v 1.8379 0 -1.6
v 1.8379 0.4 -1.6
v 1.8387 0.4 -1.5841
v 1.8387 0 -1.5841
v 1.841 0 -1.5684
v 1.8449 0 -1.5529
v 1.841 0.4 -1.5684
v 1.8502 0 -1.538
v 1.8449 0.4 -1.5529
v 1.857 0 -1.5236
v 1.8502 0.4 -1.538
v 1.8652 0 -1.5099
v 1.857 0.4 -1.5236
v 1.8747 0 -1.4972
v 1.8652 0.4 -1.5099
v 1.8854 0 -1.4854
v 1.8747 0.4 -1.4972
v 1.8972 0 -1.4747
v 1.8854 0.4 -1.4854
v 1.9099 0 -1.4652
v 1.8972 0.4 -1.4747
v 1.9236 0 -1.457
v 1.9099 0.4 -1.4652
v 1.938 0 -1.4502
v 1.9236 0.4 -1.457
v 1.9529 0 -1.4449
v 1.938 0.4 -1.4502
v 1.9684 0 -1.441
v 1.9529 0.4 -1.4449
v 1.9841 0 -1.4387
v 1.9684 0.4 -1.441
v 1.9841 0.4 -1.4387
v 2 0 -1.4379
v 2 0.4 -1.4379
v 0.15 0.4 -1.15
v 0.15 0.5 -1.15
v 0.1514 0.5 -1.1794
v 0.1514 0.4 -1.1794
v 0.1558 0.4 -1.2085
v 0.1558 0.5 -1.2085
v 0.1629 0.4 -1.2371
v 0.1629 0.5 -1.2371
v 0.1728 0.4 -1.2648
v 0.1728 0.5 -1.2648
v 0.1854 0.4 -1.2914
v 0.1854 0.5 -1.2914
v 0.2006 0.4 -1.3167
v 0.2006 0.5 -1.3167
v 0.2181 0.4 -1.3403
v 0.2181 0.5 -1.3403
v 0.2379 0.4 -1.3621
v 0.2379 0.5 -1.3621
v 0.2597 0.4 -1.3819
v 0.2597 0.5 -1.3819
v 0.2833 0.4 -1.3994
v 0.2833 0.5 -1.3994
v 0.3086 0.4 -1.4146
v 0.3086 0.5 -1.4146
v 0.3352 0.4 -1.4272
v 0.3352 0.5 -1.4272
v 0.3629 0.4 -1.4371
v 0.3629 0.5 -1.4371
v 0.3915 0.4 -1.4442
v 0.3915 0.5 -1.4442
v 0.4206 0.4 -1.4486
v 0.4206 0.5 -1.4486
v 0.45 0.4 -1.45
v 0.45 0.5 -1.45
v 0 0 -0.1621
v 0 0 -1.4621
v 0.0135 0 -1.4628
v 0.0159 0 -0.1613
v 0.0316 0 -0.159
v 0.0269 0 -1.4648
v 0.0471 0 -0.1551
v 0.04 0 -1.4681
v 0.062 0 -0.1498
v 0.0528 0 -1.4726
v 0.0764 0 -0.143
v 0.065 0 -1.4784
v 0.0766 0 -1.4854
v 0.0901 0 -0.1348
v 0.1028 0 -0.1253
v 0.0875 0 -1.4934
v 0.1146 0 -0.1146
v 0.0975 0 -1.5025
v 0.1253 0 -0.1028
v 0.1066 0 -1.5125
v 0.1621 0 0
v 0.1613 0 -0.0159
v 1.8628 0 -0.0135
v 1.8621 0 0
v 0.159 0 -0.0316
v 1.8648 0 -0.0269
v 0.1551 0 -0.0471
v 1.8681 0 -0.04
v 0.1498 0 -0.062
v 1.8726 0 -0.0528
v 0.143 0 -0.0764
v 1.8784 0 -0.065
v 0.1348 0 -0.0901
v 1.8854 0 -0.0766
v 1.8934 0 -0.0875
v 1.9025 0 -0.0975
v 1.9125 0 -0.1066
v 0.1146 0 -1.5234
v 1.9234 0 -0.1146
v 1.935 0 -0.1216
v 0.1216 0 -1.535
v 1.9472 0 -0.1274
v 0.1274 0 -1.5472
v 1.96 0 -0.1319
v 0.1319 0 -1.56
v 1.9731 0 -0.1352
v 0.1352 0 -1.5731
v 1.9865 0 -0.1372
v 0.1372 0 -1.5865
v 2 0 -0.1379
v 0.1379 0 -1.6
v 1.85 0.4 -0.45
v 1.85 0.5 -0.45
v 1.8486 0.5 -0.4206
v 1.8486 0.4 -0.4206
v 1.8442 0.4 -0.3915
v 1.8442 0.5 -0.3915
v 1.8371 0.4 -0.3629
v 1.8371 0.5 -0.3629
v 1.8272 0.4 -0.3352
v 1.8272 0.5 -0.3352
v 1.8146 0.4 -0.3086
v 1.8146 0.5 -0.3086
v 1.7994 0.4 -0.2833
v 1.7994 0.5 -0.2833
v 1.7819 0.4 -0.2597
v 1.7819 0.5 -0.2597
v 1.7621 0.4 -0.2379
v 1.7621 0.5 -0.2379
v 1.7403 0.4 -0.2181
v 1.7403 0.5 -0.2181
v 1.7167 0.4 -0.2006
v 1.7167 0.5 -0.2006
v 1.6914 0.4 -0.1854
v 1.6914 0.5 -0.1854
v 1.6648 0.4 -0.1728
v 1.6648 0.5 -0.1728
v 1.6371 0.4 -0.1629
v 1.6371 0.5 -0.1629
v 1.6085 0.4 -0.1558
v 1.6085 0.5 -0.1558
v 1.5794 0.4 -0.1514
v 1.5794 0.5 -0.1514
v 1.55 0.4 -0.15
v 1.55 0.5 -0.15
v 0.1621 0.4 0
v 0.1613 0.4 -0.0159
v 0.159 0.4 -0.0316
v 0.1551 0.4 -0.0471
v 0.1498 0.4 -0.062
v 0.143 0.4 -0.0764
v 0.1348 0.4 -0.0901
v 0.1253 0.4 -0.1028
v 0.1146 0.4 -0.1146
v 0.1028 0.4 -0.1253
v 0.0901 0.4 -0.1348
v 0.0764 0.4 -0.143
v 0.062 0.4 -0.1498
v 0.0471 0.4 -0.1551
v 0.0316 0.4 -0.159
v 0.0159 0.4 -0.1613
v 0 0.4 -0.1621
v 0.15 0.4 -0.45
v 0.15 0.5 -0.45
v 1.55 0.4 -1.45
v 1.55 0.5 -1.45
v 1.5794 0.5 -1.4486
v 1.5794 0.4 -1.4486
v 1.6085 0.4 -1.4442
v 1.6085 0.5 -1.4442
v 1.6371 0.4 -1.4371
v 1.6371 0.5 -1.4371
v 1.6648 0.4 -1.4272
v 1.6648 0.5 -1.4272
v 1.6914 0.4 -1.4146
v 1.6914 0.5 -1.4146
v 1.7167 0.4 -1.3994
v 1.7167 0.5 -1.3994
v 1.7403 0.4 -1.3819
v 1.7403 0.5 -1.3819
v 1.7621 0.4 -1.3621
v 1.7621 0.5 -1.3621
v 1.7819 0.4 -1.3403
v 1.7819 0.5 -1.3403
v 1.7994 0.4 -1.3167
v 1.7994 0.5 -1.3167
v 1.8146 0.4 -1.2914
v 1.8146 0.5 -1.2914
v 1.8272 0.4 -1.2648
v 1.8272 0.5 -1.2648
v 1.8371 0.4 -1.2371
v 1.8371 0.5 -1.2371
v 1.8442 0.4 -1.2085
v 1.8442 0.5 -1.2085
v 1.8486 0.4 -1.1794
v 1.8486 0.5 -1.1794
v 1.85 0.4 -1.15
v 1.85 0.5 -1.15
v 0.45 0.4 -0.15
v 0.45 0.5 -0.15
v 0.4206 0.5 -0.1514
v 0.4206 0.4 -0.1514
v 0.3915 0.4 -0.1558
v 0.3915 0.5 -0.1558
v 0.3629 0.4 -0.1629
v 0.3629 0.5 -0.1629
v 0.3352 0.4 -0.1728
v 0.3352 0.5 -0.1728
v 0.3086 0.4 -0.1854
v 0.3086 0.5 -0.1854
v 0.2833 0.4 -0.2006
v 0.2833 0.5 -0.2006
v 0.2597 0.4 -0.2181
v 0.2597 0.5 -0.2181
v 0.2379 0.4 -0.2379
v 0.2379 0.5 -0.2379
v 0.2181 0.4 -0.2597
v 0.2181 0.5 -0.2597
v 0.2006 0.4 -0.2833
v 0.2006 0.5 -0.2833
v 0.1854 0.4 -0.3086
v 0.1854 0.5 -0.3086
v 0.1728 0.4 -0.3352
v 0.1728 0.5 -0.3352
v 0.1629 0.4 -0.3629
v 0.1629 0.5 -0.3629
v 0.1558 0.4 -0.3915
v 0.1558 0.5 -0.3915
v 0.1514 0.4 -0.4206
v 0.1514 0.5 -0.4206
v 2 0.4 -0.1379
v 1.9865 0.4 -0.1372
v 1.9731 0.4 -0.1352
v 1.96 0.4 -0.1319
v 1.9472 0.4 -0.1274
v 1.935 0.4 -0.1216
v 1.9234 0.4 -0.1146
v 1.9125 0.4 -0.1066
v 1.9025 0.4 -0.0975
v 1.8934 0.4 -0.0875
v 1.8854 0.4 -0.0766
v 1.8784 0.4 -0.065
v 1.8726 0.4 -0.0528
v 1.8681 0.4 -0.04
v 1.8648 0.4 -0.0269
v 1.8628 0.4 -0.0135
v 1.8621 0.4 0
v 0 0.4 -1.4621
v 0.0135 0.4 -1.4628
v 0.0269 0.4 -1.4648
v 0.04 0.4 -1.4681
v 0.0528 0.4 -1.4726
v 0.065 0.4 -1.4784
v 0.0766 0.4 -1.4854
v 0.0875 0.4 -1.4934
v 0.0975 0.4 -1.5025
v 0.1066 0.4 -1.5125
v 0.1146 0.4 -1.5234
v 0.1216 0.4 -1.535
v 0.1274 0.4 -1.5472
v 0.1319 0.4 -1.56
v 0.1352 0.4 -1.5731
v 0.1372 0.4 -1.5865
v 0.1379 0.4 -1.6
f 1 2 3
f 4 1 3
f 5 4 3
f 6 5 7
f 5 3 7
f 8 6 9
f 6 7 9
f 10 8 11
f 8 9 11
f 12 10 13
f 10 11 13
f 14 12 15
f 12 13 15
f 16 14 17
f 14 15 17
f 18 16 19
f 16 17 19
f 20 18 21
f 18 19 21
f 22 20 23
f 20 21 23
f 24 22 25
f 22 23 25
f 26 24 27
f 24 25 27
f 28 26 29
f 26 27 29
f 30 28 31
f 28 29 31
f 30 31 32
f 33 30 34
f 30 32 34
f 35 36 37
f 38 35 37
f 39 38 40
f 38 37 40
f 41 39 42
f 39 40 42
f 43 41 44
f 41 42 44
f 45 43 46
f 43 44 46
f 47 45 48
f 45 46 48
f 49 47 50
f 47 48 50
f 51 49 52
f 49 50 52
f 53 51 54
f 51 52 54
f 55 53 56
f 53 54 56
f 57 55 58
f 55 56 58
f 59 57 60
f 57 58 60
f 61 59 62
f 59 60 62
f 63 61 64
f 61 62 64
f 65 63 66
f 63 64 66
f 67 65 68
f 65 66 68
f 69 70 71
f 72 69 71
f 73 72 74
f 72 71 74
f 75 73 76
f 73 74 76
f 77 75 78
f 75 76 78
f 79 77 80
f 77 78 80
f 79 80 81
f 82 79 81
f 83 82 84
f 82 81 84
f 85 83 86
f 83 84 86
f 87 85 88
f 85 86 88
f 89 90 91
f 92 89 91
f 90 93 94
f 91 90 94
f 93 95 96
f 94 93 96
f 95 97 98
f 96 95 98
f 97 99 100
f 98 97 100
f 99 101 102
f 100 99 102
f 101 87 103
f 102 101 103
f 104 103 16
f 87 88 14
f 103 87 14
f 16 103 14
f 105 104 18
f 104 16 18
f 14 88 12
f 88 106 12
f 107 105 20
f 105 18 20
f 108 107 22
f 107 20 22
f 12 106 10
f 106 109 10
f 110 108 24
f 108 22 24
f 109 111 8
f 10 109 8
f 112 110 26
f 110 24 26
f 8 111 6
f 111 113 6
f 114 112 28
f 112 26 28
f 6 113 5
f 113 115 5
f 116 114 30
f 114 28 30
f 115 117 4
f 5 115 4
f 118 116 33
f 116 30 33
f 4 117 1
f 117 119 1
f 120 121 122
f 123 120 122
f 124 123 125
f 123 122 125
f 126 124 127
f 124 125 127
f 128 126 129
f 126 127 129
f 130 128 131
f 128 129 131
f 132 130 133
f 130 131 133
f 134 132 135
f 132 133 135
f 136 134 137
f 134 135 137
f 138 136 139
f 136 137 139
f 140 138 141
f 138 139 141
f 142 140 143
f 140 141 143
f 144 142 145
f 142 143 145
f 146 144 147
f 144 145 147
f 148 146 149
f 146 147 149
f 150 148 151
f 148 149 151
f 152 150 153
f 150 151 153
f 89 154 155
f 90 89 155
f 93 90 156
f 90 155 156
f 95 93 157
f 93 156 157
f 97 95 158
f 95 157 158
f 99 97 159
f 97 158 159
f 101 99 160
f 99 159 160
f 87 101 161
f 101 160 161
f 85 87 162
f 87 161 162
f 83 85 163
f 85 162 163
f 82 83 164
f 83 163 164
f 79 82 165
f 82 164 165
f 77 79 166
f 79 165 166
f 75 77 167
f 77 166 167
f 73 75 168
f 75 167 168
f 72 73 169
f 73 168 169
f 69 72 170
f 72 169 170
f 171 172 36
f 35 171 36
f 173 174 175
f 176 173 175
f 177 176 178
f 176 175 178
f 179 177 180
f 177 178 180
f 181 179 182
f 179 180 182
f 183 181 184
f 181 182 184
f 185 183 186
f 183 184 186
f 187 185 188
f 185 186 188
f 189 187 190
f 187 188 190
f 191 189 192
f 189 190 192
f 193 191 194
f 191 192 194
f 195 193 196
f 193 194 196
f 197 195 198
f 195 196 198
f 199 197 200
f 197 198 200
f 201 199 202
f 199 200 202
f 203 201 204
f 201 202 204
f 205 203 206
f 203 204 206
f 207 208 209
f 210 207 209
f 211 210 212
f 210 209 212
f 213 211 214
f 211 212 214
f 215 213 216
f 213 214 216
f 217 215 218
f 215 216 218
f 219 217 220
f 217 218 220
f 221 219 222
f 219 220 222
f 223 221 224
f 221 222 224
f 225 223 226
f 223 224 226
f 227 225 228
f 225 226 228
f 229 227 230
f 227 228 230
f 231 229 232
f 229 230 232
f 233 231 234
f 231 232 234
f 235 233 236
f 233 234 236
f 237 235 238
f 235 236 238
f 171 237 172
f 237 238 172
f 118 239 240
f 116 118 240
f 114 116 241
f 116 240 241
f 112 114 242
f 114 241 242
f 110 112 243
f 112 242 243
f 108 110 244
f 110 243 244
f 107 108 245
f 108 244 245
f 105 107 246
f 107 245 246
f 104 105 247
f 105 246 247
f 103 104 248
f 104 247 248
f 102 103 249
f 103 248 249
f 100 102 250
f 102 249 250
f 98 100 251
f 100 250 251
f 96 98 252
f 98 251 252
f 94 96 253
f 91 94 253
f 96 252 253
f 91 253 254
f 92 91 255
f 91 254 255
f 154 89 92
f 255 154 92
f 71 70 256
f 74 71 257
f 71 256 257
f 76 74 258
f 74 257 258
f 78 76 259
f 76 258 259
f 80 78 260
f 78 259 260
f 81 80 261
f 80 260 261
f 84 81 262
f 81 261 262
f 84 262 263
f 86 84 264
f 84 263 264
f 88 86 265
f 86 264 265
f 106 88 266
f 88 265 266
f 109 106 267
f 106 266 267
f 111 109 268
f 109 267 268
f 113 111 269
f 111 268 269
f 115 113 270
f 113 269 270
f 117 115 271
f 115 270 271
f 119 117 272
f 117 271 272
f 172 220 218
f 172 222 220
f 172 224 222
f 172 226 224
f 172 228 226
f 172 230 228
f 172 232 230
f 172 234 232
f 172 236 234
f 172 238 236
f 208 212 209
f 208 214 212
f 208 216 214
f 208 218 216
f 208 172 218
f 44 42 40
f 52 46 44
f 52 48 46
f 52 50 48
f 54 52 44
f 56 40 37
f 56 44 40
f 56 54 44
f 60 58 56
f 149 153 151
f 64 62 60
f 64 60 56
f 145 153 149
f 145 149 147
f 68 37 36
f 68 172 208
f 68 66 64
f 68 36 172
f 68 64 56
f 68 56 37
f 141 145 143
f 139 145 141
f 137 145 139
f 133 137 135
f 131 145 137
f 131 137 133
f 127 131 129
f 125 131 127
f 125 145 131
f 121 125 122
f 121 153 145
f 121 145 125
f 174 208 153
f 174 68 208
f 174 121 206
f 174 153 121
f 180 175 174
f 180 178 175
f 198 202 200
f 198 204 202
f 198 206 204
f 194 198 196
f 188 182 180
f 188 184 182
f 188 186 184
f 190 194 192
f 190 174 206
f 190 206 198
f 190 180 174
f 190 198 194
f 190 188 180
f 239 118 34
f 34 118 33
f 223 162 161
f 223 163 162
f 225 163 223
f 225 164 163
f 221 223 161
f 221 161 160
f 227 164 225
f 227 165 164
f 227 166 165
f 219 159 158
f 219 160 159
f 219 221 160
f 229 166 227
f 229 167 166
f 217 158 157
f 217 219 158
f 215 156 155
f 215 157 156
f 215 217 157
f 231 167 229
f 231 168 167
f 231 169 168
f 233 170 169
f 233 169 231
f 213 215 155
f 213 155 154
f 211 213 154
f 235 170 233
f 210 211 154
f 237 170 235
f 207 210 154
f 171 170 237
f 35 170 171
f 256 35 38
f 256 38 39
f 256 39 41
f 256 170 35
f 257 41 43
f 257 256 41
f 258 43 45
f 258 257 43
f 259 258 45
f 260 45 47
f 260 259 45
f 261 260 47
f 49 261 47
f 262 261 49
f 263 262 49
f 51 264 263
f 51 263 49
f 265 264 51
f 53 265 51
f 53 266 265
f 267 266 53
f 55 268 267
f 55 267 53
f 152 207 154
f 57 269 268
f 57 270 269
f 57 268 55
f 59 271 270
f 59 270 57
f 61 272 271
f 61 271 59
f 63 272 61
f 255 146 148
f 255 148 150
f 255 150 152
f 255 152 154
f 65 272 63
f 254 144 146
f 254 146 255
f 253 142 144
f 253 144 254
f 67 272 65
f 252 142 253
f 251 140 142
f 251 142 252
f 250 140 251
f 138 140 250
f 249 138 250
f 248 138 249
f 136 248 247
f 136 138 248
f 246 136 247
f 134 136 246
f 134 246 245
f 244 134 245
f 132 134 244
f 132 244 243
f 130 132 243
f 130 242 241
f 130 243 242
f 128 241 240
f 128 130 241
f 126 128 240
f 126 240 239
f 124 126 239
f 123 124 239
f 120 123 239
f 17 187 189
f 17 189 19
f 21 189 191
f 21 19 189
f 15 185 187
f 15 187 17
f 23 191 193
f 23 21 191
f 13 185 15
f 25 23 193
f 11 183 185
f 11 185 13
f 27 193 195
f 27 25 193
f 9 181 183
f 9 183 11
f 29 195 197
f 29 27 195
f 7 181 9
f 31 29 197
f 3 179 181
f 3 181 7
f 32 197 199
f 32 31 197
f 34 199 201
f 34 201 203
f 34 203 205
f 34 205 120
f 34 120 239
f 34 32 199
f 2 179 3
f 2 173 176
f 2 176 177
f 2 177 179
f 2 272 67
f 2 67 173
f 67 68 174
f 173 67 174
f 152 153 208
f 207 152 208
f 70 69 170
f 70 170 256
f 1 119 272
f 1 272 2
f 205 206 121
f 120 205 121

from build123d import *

# Parameters (mm, degrees)
SKETCH1_W           = 2
SKETCH1_H           = 1.6
BOSS_EXTRUDE1_DEPTH = 0.5
SKETCH3_W           = 2
SKETCH3_H           = 1.6
CUT_EXTRUDE1_DEPTH  = 0.1
CUT_EXTRUDE2_DEPTH  = 0.5


with BuildPart() as part:
    # Sketch1 → Boss-Extrude1 (new body)
    with BuildSketch(Plane(origin=(0, 0, 0), x_dir=(1, 0, 0), z_dir=(0, 1, 0))):
        with Locations((1, 0.8)):
            Rectangle(SKETCH1_W, SKETCH1_H)
    extrude(amount=BOSS_EXTRUDE1_DEPTH)

    # Sketch3 → Cut-Extrude1 (cut)
    with BuildSketch(Plane(origin=(0, 0.5, 0), x_dir=(1, 0, 0), z_dir=(0, 1, 0))):
        with Locations((1, 0.8)):
            Rectangle(SKETCH3_W, SKETCH3_H)
        with BuildLine():
            Line((0.45, 1.45), (1.55, 1.45))
            ThreePointArc((1.55, 1.45), (1.762132034, 1.362132034), (1.85, 1.15))
            Line((1.85, 1.15), (1.85, 0.45))
            ThreePointArc((1.85, 0.45), (1.762132034, 0.237867966), (1.55, 0.15))
            Line((1.55, 0.15), (0.45, 0.15))
            ThreePointArc((0.45, 0.15), (0.237867966, 0.237867966), (0.15, 0.45))
            Line((0.15, 0.45), (0.15, 1.15))
            ThreePointArc((0.15, 1.15), (0.237867966, 1.362132034), (0.45, 1.45))
        make_face(mode=Mode.SUBTRACT)
    extrude(amount=-CUT_EXTRUDE1_DEPTH, mode=Mode.SUBTRACT)

    # Sketch2 → Cut-Extrude2 (cut)
    with BuildSketch(Plane(origin=(0, 0.5, 0), x_dir=(1, 0, 0), z_dir=(0, 1, 0))):
        with BuildLine():
            ThreePointArc((0, 1.462118963), (0.097496616, 1.502503384), (0.137881037, 1.6))
            Line((0.137881037, 1.6), (0, 1.6))
            Line((0, 1.6), (0, 1.462118963))
        make_face()
        with BuildLine():
            Line((2, 1.6), (1.837881037, 1.6))
            ThreePointArc((1.837881037, 1.6), (1.885364582, 1.485364582), (2, 1.437881037))
            Line((2, 1.437881037), (2, 1.6))
        make_face()
        with BuildLine():
            ThreePointArc((0.162118963, 0), (0.114635418, 0.114635418), (0, 0.162118963))
            Line((0, 0.162118963), (0, 0))
            Line((0, 0), (0.162118963, 0))
        make_face()
        with BuildLine():
            Line((2, 0), (2, 0.137881037))
            ThreePointArc((2, 0.137881037), (1.902503384, 0.097496616), (1.862118963, 0))
            Line((1.862118963, 0), (2, 0))
        make_face()
    extrude(amount=-CUT_EXTRUDE2_DEPTH, mode=Mode.SUBTRACT)


solid = part.part
